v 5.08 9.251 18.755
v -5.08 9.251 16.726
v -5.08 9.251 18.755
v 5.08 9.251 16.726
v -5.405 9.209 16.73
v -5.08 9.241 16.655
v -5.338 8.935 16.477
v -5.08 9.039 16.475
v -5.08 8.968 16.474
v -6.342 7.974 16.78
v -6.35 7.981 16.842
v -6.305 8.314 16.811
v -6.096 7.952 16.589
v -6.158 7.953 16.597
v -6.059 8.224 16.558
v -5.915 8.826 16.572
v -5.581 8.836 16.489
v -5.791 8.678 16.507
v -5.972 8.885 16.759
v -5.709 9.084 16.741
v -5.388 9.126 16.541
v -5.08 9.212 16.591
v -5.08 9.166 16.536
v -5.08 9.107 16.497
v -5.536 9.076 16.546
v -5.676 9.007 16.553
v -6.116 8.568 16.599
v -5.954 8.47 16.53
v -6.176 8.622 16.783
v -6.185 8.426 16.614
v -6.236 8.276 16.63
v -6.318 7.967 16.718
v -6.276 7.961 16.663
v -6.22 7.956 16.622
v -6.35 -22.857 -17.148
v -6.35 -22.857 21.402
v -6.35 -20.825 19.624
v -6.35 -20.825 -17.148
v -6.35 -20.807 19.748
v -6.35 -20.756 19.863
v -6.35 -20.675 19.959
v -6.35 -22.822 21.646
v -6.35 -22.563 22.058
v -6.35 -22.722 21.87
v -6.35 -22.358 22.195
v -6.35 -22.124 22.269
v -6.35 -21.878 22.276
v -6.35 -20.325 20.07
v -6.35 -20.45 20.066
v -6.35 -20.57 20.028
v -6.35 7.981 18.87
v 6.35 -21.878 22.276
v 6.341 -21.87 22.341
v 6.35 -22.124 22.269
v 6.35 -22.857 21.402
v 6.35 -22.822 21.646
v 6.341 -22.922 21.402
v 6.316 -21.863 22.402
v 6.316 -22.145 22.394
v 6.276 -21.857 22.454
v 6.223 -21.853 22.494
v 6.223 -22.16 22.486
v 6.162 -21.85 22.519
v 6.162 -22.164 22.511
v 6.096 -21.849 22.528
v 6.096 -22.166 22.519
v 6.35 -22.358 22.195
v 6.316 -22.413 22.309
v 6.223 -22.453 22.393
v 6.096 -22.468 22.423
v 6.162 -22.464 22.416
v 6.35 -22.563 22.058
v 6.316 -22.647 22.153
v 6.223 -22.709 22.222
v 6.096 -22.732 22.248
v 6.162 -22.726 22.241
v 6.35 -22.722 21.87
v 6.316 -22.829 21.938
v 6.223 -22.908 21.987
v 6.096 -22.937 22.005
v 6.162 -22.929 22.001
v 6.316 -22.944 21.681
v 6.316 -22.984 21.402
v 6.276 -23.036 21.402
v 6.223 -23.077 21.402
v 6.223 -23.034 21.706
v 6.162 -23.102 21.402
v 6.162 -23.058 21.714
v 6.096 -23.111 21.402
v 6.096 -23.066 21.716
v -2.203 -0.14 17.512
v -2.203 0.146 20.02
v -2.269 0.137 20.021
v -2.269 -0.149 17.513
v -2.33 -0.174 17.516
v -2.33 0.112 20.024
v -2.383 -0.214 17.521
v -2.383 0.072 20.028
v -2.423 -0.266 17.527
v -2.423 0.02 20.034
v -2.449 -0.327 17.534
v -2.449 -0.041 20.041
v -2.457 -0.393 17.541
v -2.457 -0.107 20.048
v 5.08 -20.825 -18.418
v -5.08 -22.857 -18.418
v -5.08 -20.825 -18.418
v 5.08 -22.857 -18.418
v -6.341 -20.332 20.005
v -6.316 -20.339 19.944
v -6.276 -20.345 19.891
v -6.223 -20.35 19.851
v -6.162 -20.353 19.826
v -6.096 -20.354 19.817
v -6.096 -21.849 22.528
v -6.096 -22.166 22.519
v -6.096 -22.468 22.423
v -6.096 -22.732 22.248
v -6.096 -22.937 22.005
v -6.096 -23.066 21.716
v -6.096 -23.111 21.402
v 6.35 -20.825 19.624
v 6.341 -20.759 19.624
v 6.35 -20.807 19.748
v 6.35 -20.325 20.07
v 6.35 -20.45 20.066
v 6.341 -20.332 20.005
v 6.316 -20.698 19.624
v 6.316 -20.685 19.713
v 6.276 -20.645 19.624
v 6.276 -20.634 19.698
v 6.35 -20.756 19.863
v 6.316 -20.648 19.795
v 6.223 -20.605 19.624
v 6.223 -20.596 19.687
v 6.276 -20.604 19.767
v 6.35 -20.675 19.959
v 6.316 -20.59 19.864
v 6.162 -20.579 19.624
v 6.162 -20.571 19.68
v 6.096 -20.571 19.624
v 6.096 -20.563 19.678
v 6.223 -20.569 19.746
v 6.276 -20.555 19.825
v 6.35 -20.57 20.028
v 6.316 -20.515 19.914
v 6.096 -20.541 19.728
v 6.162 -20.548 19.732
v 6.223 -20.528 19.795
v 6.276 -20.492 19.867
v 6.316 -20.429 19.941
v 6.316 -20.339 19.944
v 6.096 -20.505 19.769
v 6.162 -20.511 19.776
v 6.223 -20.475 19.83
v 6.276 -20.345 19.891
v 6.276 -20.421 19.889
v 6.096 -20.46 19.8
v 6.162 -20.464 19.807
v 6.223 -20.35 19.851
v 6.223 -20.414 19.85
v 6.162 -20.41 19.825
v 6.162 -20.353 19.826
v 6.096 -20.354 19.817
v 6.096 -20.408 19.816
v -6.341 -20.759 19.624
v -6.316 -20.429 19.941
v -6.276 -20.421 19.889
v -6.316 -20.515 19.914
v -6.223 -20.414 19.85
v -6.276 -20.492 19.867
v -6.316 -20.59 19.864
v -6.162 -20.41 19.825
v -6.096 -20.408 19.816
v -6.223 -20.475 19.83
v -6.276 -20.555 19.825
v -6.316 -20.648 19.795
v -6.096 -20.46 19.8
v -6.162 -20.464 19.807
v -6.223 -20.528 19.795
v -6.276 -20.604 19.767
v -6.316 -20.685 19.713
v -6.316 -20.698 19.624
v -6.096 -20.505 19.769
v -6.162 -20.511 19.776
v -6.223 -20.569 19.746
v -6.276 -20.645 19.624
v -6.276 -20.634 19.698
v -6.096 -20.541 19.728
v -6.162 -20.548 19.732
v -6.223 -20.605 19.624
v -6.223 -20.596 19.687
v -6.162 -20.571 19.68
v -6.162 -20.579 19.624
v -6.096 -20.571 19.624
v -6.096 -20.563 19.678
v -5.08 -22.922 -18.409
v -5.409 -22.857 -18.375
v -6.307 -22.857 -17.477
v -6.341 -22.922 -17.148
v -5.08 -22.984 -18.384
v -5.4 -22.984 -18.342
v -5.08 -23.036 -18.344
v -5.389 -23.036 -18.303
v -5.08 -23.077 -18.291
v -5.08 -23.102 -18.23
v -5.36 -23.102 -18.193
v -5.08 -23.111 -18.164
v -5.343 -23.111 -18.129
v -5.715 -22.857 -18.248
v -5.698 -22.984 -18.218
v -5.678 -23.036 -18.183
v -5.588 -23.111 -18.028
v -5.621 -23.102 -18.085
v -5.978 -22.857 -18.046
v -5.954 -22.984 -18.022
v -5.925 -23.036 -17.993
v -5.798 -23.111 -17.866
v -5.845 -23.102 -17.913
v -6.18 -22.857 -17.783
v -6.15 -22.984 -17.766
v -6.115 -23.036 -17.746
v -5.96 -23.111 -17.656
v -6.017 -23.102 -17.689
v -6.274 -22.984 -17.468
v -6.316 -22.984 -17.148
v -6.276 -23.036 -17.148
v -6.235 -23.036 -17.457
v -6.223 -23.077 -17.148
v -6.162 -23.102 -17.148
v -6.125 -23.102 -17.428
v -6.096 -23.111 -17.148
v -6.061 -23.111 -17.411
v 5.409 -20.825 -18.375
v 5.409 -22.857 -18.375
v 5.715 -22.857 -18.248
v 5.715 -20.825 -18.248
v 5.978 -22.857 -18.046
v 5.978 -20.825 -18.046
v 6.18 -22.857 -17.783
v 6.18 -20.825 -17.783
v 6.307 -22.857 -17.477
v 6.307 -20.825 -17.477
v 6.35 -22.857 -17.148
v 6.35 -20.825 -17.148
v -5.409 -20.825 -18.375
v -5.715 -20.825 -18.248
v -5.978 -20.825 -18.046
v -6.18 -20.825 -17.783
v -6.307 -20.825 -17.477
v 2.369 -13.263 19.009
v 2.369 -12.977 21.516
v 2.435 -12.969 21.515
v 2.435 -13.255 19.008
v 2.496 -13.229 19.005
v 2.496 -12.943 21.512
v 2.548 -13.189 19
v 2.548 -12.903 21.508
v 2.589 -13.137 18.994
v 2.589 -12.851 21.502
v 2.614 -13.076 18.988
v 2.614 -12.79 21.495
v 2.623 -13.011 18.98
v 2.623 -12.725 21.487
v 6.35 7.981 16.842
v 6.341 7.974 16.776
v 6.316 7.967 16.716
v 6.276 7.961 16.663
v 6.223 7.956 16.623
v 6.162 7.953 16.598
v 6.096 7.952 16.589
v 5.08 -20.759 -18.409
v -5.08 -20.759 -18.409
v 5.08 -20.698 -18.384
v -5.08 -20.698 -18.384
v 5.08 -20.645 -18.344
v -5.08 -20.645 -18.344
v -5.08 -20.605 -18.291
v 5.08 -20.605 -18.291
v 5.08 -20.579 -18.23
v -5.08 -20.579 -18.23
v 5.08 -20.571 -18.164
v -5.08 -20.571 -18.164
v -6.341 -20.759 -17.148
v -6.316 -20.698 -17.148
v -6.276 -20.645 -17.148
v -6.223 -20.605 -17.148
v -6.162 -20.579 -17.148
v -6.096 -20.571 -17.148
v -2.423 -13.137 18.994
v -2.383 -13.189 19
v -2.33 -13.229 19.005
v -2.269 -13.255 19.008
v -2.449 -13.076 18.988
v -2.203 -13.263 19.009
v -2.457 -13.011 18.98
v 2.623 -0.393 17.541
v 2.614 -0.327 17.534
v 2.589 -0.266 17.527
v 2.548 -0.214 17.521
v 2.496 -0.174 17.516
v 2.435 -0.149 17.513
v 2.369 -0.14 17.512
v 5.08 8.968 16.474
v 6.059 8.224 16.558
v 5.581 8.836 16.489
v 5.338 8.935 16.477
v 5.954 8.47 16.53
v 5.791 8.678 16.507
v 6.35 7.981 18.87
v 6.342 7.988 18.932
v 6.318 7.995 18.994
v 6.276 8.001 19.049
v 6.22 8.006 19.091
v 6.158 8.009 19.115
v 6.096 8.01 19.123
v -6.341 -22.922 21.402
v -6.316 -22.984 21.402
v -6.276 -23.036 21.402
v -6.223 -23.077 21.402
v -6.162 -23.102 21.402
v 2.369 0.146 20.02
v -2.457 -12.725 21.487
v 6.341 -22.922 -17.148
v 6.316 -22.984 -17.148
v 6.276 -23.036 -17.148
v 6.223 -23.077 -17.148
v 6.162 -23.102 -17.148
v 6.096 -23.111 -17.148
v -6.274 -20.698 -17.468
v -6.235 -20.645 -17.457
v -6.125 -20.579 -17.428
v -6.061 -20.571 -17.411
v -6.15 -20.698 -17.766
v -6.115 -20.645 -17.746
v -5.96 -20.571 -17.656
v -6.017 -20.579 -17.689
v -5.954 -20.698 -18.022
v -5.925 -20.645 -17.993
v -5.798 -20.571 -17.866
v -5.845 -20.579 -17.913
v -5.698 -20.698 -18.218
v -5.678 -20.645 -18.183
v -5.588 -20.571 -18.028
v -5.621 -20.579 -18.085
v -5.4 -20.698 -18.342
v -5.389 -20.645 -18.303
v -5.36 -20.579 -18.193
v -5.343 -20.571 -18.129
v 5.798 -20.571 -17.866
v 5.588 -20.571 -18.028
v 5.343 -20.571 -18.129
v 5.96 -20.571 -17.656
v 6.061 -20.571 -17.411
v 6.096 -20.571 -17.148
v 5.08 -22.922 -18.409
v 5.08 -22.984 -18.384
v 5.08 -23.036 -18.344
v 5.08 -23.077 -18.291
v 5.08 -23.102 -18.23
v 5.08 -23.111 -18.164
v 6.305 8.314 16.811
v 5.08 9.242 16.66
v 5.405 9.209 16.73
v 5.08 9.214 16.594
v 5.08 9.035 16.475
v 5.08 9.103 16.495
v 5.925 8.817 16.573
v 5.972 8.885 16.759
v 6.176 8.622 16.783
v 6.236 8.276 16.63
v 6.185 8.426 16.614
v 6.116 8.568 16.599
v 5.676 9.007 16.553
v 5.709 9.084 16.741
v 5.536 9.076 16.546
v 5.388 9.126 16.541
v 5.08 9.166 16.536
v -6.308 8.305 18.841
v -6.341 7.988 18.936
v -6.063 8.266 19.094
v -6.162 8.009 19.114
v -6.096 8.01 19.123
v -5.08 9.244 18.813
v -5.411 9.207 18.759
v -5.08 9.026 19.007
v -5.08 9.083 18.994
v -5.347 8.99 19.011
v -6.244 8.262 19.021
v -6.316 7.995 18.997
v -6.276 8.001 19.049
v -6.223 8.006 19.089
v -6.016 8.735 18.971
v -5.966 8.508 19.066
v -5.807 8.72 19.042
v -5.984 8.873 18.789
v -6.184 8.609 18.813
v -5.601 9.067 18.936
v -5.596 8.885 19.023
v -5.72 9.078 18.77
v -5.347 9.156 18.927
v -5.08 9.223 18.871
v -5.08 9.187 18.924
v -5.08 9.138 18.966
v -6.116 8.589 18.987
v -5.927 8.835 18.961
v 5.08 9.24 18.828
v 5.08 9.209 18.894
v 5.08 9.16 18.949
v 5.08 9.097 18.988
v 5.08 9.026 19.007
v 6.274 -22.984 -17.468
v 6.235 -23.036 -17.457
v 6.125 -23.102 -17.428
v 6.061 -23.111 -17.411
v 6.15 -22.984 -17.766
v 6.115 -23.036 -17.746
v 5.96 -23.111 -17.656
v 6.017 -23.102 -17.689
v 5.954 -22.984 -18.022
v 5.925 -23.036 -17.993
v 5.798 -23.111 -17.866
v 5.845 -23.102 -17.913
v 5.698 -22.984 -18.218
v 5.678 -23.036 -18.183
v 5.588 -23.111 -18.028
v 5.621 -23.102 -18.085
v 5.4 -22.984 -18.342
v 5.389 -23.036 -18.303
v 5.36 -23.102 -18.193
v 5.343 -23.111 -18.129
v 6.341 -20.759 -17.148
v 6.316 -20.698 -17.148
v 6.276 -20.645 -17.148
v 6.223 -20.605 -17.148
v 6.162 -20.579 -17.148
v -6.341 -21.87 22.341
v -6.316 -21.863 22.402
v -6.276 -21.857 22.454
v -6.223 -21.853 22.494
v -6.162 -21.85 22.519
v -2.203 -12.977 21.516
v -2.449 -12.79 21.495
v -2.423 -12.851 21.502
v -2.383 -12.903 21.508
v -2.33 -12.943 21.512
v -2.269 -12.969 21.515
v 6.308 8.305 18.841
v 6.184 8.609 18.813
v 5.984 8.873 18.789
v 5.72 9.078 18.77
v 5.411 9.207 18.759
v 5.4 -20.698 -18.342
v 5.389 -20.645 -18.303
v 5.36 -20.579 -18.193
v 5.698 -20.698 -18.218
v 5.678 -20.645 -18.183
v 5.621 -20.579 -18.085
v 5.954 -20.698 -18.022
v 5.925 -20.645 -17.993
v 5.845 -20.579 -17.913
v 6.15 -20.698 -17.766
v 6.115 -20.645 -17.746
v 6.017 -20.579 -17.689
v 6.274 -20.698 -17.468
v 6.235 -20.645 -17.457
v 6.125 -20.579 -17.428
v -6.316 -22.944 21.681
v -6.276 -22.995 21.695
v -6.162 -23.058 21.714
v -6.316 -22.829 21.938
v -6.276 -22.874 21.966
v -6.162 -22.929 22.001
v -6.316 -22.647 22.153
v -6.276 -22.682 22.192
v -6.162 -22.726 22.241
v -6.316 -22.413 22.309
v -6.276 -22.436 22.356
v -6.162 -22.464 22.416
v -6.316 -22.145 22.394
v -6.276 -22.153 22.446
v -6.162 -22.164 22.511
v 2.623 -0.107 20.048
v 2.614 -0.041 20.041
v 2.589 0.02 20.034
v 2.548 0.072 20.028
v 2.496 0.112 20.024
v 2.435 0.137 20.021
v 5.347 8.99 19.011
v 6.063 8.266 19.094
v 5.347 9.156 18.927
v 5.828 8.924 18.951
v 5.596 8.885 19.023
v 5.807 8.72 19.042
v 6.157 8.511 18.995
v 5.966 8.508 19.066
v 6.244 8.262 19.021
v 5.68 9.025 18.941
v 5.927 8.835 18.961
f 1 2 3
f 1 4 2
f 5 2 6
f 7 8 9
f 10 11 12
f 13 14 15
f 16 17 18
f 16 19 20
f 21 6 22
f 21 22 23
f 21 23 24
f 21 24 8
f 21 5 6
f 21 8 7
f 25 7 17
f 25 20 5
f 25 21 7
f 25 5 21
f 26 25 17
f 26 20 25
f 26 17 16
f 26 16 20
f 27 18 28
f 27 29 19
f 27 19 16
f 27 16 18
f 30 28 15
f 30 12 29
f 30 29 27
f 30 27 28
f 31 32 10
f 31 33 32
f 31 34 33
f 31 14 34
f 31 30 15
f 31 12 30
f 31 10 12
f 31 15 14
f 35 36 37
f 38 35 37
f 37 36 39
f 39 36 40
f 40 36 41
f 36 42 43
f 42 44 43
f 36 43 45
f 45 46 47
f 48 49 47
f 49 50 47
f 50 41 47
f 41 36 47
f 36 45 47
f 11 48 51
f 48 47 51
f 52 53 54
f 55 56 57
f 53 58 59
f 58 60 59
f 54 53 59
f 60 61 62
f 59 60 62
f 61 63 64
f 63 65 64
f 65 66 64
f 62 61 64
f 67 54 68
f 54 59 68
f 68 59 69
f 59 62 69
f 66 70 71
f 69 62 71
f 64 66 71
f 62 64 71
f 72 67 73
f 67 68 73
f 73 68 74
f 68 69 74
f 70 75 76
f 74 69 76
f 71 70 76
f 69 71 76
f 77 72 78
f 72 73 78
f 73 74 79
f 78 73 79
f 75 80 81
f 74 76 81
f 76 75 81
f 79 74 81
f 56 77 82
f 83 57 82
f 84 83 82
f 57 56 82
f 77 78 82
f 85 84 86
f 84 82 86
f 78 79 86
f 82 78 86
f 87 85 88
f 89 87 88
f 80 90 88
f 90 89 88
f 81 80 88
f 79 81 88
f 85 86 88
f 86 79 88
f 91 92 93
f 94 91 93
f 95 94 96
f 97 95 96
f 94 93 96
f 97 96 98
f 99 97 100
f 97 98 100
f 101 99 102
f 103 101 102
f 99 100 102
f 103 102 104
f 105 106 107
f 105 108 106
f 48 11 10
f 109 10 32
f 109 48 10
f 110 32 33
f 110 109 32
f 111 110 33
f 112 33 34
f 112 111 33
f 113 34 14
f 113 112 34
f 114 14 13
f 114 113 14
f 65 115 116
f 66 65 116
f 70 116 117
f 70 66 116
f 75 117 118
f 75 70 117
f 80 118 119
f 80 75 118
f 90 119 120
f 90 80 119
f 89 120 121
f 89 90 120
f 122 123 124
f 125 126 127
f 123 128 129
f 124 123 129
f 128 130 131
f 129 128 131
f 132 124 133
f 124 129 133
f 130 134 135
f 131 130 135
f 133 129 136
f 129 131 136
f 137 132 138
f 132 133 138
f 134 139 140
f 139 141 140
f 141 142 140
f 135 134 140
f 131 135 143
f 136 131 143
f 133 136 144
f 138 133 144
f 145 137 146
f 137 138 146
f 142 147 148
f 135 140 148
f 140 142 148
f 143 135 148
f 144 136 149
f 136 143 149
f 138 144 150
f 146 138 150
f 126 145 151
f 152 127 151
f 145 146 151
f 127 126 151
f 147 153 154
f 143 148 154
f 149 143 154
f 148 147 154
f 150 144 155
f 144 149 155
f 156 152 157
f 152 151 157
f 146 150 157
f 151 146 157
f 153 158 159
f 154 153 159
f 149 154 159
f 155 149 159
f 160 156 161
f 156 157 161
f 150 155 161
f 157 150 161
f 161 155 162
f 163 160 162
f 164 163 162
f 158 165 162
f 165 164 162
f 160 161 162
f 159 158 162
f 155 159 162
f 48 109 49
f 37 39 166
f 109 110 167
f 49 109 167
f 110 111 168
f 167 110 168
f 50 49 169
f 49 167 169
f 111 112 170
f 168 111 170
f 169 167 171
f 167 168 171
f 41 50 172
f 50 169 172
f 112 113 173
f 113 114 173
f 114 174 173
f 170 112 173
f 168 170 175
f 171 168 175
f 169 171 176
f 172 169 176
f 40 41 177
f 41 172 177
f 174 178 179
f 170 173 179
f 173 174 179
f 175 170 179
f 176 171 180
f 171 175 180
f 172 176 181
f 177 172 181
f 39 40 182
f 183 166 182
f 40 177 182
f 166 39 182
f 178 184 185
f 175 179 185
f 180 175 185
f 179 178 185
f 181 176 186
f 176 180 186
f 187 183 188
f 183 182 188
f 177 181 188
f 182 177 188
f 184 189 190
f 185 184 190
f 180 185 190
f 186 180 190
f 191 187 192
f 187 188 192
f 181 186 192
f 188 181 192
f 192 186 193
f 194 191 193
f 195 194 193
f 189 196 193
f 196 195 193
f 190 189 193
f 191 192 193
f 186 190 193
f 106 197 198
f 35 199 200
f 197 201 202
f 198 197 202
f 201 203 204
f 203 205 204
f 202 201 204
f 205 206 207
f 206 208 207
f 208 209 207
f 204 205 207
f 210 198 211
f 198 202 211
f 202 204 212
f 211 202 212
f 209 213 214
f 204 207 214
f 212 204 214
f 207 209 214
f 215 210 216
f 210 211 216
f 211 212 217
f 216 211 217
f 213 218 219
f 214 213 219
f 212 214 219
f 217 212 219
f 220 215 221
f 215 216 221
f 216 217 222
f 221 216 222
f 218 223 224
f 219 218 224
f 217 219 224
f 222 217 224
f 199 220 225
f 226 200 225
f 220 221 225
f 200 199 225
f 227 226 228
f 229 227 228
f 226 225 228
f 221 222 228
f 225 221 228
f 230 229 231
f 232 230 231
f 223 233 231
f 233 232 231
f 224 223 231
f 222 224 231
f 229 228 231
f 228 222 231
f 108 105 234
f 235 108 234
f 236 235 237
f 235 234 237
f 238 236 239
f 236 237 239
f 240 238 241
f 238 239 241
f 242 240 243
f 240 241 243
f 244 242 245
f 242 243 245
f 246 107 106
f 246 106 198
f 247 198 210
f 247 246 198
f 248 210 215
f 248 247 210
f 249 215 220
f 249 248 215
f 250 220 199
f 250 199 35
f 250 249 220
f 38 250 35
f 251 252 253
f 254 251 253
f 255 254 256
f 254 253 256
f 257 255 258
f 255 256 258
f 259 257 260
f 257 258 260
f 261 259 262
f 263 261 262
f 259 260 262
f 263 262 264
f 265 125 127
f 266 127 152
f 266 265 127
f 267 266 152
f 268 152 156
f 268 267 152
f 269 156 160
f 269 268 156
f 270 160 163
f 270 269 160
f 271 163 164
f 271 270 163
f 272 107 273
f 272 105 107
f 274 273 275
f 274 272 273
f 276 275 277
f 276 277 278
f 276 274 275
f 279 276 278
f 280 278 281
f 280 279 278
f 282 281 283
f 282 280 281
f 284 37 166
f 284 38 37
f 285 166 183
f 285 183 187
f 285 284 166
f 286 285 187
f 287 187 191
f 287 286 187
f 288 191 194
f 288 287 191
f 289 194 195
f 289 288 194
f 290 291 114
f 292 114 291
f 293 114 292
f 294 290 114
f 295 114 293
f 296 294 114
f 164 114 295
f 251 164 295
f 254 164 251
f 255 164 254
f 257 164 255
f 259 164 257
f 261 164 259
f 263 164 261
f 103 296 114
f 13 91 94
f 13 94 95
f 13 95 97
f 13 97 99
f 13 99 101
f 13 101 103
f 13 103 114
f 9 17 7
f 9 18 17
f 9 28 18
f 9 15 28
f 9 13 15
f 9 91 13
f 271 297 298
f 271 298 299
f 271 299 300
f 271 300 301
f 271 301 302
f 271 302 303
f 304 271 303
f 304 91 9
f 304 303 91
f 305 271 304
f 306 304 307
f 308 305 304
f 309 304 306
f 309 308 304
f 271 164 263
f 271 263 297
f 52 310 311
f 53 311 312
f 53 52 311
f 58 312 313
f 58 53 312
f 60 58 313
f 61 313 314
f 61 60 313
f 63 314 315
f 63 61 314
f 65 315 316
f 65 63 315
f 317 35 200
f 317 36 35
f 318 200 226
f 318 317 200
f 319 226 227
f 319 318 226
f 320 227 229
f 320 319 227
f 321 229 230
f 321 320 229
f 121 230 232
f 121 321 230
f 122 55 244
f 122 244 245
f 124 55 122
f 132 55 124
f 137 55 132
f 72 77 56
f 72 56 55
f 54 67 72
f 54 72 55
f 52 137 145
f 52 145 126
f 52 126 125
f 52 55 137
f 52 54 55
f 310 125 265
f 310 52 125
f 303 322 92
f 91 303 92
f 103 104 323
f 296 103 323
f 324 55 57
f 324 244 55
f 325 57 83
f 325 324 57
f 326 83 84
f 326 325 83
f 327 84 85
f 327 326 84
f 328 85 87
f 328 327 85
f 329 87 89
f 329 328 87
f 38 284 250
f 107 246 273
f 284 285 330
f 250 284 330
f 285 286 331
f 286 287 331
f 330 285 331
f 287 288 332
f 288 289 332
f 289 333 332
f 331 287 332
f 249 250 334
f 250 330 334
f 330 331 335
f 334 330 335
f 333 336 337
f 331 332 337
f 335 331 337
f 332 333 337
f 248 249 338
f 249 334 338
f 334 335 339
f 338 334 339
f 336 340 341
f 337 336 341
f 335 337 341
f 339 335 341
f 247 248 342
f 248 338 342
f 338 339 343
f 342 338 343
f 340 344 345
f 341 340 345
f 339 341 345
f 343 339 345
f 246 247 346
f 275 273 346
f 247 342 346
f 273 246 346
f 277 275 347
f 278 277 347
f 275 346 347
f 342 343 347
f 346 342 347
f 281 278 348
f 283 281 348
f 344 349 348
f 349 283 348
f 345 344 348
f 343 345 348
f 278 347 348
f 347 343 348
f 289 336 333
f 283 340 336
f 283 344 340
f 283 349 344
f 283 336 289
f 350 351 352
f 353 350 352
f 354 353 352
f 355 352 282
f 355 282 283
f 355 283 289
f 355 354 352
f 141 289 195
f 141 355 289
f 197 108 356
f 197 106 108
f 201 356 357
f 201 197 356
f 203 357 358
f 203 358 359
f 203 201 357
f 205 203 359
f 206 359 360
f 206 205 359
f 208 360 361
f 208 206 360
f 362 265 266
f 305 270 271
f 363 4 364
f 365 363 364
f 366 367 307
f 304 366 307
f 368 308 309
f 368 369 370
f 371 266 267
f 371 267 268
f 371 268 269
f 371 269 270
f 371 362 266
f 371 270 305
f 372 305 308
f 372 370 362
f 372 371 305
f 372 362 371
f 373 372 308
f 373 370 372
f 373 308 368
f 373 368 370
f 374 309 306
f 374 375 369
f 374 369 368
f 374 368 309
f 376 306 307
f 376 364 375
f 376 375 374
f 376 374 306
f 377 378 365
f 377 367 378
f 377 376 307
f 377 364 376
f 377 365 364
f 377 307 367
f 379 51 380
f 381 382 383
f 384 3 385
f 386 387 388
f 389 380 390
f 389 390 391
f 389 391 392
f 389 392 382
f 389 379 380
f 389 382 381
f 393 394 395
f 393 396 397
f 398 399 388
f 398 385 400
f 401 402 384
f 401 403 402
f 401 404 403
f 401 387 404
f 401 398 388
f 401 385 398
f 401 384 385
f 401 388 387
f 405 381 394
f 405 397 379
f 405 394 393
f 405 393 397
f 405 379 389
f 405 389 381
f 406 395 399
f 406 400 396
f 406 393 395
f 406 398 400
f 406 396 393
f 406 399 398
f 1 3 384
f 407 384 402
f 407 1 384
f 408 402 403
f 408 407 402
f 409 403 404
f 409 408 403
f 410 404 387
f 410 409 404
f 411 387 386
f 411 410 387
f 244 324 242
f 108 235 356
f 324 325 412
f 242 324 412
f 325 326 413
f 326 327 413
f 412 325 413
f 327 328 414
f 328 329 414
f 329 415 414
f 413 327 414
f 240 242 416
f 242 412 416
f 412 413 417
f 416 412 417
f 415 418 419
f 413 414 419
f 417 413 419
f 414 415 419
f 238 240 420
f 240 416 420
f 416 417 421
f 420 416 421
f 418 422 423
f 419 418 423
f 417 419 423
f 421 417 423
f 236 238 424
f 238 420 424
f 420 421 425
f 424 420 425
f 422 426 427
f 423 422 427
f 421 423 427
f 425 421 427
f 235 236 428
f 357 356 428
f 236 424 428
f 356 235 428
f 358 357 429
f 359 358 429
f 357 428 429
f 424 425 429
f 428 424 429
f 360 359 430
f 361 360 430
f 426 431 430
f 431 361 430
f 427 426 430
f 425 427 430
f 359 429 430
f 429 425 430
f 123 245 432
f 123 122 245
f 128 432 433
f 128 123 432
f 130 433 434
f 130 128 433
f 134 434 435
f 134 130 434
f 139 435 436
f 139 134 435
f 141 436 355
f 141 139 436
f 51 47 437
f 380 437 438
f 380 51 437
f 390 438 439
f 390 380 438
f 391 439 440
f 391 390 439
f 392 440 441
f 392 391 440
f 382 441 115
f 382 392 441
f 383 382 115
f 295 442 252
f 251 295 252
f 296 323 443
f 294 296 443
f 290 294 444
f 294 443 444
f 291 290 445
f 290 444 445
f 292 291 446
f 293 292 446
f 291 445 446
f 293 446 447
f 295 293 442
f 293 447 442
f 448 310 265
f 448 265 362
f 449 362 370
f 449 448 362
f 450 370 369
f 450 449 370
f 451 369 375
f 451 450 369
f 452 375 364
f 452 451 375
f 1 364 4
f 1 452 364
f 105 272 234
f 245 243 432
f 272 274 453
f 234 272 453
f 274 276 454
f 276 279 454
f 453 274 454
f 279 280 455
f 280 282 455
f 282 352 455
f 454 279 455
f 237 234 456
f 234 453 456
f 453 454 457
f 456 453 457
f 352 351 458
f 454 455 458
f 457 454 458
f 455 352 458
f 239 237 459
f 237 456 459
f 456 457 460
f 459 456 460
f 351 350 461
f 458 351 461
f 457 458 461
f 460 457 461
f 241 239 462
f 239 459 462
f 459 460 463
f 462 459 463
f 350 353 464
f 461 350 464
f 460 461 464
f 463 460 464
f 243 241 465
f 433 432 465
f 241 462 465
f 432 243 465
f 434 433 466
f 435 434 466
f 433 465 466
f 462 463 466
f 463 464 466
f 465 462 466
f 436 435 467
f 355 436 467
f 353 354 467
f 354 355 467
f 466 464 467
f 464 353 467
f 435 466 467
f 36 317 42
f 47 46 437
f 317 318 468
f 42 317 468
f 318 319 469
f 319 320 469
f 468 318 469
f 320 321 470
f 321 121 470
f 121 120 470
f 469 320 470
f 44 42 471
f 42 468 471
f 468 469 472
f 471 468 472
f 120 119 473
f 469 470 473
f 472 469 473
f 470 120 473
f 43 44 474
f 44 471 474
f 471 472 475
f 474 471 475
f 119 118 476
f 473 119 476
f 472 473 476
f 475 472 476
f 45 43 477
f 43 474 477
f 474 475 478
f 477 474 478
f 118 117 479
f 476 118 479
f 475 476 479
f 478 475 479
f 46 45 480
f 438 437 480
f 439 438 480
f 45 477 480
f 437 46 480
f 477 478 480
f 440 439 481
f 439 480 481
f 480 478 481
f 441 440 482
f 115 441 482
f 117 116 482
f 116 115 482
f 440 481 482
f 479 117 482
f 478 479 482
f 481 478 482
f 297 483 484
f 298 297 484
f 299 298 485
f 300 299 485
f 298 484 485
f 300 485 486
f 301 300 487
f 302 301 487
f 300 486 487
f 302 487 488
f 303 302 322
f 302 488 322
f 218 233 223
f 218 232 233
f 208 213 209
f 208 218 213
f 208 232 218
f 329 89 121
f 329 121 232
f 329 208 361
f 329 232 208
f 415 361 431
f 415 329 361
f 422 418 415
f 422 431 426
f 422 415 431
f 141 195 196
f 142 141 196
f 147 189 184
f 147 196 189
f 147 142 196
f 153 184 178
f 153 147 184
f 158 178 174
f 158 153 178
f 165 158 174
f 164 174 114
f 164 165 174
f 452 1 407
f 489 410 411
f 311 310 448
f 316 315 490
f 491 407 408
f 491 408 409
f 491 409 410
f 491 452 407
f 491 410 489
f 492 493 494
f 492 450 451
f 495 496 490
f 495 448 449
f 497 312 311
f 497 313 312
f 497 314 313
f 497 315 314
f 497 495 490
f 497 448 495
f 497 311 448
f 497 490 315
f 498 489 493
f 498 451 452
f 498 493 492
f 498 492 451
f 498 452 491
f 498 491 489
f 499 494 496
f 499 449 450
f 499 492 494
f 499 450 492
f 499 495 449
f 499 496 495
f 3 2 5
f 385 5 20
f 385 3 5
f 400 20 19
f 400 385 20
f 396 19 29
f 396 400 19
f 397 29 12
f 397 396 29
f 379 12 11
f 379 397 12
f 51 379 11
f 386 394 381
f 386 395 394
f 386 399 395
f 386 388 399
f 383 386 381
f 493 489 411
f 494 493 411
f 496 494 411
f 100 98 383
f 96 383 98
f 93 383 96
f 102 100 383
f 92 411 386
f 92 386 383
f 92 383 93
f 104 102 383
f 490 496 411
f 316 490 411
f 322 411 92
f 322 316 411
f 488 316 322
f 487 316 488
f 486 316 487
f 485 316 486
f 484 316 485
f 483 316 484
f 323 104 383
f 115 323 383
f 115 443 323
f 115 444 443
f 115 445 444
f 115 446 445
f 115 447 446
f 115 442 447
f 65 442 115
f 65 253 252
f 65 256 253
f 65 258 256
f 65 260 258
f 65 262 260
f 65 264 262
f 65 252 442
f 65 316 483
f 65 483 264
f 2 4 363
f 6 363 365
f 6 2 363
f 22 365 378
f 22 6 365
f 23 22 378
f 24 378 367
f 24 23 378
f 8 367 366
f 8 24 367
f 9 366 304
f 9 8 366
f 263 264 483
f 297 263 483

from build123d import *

# Parameters (mm, degrees)
F1_DEPTH = 6.35
F2_R     = 1.27
F3_R     = 0.254
F5_DEPTH = 2.5236418215


with BuildPart() as f1:
    # F0 (on Right) → F1 (new body, symmetric)
    with BuildSketch(Plane.YZ):
        with BuildLine():
            Line((-20.3536781971, 19.8174831357), (9.2510120329, 16.4412551424))
            Line((9.2510120329, 16.4412551424), (9.2510120329, 18.9812551424))
            Line((9.2510120329, 18.9812551424), (-21.8487802355, 22.5279900829))
            ThreePointArc((-21.8487802355, 22.5279900829), (-22.7318674452, 22.2475119605), (-23.1106011462, 21.4018927905))
            Line((-23.1106011462, 21.4018927905), (-23.1106011462, -18.4179837987))
            Line((-23.1106011462, -18.4179837987), (-20.5706011462, -18.4179837987))
            Line((-20.5706011462, -18.4179837987), (-20.5706011462, 19.6238927905))
            ThreePointArc((-20.5706011462, 19.6238927905), (-20.5054920403, 19.7692654045), (-20.3536781971, 19.8174831357))
        make_face()
    extrude(amount=F1_DEPTH, both=True)

    # F2
    f2_edges = [f1.edges().sort_by_distance(p)[0] for p in [
        (6.35, 9.251012, 17.711255),
        (-6.35, 9.251012, 17.711255),
        (-6.35, -21.840601, -18.417984),
        (6.35, -21.840601, -18.417984),
    ]]
    fillet(f2_edges, radius=F2_R)

    # F3
    f3_edges = [f1.edges().sort_by_distance(p)[0] for p in [
        (6.35, -23.110601, 2.126954),
        (6.35, -20.570601, 1.237954),
    ]]
    fillet(f3_edges, radius=F3_R)

    # F4 (on face) → F5 (cut, through all)
    with BuildSketch(Plane(origin=(0, 2.2556734095, 19.779029343), x_dir=(1, 0, 0), z_dir=(0, 0.1133092186, 0.9935597722))):
        with BuildLine():
            Line((2.3688334775, -2.1236329222), (-2.2031665225, -2.1236329222))
            ThreePointArc((-2.2031665225, -2.1236329222), (-2.382771645, -2.1980277998), (-2.4571665225, -2.3776329222))
            Line((-2.4571665225, -2.3776329222), (-2.4571665225, -15.0776329222))
            ThreePointArc((-2.4571665225, -15.0776329222), (-2.382771645, -15.2572380446), (-2.2031665225, -15.3316329222))
            Line((-2.2031665225, -15.3316329222), (2.3688334775, -15.3316329222))
            ThreePointArc((2.3688334775, -15.3316329222), (2.5484385999, -15.2572380446), (2.6228334775, -15.0776329222))
            Line((2.6228334775, -15.0776329222), (2.6228334775, -2.3776329222))
            ThreePointArc((2.6228334775, -2.3776329222), (2.5484385999, -2.1980277998), (2.3688334775, -2.1236329222))
        make_face()
    extrude(amount=-F5_DEPTH, mode=Mode.SUBTRACT)


solid = f1.part
